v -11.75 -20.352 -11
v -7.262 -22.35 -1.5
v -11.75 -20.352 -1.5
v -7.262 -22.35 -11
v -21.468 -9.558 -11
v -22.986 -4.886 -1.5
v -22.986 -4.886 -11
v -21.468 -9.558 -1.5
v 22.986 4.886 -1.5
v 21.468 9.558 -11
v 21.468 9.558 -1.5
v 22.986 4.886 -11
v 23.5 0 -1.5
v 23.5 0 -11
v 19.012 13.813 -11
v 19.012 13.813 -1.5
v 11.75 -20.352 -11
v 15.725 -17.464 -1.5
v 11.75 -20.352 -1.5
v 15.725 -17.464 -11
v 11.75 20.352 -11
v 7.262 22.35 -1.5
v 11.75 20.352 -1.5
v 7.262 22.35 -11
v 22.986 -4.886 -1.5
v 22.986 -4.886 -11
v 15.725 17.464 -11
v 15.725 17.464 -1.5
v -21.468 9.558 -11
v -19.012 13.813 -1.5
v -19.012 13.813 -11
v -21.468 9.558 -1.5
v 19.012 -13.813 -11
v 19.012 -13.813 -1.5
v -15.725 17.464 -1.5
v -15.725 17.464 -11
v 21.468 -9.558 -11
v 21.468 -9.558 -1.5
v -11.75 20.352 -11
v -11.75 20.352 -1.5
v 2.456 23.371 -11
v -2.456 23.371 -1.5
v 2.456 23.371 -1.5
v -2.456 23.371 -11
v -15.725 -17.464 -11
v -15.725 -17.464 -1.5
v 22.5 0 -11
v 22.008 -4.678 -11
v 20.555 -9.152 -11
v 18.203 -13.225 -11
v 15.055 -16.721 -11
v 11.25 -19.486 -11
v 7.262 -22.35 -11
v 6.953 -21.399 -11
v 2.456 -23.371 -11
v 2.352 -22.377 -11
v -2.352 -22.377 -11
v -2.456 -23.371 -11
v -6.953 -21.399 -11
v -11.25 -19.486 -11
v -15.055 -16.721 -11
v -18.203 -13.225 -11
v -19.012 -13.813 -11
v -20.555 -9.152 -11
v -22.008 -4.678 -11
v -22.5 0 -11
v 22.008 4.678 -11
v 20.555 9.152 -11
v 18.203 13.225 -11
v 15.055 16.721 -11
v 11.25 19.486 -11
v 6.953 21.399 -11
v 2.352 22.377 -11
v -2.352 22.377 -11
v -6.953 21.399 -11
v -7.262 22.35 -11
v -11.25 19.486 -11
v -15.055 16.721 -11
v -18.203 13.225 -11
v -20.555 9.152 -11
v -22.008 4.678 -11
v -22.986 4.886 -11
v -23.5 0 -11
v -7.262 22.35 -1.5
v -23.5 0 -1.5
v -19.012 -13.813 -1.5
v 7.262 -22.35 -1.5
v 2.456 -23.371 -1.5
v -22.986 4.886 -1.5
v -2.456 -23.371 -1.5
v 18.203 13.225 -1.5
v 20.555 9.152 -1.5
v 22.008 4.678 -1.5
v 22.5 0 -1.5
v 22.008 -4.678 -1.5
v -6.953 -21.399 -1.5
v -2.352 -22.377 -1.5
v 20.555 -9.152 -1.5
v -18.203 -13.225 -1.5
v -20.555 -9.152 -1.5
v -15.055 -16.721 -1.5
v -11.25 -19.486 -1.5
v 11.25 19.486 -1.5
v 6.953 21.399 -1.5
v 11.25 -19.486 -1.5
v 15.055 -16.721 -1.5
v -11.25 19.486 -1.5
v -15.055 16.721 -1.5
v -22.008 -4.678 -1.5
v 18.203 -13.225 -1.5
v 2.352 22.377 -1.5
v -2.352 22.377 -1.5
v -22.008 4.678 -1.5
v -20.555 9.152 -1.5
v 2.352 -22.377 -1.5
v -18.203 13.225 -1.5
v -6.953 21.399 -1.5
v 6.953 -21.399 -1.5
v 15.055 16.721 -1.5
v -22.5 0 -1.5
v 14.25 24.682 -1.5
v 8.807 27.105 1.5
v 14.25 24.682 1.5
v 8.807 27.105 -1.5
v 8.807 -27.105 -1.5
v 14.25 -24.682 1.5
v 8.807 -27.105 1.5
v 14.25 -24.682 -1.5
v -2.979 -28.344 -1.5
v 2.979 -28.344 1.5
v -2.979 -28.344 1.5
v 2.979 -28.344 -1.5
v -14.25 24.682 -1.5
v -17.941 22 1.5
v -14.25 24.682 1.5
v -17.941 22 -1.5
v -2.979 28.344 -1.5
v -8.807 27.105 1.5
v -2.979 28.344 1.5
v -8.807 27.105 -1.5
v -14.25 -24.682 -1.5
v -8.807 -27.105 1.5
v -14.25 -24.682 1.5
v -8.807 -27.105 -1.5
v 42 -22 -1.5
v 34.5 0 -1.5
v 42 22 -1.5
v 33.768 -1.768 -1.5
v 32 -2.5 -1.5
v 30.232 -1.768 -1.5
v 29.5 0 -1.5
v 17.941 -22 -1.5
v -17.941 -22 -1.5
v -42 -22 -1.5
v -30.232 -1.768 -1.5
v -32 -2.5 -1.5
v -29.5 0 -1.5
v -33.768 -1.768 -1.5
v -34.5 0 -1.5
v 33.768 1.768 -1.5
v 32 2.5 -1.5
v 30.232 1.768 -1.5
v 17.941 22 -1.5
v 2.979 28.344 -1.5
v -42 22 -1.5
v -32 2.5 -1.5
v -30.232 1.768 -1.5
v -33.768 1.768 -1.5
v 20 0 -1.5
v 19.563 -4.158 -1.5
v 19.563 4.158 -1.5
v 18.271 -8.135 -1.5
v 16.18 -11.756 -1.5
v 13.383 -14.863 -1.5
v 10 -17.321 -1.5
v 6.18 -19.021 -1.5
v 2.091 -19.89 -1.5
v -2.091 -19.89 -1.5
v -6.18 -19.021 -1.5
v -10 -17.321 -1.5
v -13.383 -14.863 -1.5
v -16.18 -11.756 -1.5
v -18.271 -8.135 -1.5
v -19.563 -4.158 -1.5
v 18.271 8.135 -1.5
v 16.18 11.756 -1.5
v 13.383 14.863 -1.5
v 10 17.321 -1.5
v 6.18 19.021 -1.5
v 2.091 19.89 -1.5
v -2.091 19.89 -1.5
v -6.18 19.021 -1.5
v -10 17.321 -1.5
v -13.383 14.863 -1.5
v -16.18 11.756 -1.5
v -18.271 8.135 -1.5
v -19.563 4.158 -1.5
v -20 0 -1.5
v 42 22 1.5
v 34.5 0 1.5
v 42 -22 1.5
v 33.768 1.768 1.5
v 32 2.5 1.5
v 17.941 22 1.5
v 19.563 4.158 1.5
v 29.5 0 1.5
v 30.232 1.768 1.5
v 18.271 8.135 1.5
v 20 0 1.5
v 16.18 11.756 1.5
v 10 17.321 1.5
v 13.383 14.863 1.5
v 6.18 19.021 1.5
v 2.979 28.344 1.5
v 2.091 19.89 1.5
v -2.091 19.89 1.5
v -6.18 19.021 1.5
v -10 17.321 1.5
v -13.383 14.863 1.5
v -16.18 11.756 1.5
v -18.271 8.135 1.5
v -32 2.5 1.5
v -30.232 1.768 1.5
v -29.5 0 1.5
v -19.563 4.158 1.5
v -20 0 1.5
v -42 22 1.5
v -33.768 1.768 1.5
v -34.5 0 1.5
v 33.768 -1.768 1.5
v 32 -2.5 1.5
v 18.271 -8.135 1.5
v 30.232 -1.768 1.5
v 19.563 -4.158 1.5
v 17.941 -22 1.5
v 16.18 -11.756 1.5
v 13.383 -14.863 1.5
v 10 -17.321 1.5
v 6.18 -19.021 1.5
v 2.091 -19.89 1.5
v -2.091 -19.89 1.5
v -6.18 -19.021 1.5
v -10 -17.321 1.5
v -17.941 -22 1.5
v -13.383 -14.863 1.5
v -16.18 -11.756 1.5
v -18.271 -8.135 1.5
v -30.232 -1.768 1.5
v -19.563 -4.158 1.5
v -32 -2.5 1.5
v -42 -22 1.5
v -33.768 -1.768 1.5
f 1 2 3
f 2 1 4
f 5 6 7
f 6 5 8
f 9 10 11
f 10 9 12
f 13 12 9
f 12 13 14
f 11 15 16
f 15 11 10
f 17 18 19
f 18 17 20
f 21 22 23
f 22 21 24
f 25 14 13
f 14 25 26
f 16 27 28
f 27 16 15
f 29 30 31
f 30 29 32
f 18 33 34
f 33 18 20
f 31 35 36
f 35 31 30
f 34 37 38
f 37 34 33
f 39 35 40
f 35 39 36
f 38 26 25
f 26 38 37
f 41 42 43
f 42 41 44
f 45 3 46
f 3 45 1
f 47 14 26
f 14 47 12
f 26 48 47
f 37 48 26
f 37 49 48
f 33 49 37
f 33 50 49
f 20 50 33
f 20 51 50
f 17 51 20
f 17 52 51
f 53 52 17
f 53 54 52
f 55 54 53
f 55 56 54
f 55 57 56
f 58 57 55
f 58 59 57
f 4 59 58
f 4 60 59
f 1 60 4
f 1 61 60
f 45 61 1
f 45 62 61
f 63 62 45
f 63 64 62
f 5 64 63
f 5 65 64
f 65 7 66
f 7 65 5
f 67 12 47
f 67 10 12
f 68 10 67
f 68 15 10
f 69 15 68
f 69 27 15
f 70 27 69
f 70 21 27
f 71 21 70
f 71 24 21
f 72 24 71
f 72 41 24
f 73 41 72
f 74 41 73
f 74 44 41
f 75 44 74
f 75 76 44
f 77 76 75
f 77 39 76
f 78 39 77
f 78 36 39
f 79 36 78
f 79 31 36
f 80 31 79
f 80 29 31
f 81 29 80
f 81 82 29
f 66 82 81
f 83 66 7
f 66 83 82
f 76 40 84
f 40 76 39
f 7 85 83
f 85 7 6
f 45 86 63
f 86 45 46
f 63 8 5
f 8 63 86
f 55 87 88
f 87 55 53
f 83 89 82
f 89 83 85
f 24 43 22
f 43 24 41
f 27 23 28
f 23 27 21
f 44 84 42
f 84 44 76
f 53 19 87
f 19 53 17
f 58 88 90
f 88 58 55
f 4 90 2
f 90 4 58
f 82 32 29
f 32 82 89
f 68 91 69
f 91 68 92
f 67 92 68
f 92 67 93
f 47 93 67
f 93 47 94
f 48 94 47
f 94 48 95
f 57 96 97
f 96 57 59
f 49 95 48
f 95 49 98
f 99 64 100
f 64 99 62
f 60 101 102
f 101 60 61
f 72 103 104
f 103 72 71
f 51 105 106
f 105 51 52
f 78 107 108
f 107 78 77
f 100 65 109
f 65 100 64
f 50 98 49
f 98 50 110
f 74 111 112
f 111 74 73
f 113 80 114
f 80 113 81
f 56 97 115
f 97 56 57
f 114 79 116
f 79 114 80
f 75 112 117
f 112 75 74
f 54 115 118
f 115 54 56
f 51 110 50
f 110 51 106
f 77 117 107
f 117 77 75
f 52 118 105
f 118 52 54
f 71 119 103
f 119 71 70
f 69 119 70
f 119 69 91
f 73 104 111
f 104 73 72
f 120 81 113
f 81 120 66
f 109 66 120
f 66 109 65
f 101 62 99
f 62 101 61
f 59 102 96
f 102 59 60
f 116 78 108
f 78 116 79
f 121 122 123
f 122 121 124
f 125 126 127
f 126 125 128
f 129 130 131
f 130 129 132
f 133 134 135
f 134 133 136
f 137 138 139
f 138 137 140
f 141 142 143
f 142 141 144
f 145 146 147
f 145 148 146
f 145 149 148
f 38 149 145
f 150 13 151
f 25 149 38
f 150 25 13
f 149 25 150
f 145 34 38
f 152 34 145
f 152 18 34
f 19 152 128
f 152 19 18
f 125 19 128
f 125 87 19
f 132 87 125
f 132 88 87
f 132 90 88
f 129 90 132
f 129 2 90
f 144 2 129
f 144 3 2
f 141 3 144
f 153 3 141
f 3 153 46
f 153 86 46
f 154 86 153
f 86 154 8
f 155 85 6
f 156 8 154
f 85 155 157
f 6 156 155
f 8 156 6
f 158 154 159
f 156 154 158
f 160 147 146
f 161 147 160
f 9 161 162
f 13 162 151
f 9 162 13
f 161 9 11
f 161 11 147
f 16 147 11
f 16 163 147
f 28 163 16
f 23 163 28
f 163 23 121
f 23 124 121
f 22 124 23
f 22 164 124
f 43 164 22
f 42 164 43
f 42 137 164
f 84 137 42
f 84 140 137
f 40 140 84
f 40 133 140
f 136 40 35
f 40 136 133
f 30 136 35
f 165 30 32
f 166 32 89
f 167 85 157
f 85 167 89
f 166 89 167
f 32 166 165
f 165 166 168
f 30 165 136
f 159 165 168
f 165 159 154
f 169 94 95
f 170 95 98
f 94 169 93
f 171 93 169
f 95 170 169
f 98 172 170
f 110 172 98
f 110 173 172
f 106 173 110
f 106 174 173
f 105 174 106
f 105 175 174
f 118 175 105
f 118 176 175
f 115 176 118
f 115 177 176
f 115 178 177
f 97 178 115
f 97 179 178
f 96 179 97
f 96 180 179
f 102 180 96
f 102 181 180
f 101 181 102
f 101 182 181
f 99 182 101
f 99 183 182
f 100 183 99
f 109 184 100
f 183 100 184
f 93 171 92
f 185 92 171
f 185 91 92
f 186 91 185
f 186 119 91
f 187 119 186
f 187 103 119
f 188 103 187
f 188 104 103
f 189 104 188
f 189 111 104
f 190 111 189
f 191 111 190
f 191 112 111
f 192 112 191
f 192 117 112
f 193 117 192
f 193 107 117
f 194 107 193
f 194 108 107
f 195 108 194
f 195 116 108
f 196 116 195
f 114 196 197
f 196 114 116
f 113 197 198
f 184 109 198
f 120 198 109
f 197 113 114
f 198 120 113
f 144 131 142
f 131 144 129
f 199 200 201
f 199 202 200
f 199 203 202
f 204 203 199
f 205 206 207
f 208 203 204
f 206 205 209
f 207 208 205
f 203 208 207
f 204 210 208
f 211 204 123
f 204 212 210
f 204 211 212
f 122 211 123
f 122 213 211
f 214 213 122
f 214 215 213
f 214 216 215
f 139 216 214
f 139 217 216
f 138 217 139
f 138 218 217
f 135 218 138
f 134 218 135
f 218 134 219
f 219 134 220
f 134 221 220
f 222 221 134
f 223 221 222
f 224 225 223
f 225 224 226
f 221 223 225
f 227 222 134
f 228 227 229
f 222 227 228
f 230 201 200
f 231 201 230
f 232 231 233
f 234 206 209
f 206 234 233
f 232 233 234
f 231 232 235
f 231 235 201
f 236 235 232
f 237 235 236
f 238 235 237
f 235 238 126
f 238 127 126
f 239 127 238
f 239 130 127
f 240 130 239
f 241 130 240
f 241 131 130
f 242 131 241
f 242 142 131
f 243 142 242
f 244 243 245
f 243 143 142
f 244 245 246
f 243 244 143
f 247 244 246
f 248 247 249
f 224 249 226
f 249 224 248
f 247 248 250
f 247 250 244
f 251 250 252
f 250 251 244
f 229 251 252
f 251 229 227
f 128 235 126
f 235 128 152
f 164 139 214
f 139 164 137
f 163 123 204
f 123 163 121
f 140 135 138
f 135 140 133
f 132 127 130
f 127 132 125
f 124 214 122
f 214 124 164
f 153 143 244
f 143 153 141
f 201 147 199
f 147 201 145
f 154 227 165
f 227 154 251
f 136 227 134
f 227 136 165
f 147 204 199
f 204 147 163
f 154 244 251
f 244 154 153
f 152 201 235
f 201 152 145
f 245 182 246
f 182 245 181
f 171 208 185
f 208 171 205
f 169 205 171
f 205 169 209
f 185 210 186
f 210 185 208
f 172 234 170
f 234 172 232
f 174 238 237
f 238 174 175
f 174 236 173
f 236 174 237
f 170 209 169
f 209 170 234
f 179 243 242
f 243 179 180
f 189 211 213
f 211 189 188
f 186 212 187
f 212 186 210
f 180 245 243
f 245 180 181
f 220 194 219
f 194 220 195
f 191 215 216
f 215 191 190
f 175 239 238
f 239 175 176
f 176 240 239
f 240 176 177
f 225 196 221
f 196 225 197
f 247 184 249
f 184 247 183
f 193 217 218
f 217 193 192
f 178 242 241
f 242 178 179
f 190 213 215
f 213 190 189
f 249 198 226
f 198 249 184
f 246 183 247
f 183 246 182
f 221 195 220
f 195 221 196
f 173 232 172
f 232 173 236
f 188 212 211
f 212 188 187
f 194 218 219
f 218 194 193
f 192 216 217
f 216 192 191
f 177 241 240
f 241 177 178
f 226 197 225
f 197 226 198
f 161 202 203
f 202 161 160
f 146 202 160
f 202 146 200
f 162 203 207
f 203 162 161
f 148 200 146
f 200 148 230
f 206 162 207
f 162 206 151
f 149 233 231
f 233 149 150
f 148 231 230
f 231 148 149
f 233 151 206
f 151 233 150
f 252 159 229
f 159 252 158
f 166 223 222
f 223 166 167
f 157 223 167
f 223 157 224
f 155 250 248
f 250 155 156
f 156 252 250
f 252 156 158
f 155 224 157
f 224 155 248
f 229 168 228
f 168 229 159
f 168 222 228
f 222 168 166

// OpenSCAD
/* This file contains a tweeter speaker mount for cylindical
   tweeters, where the tweeter is glued to mount and the
   mount is either glued or screwed to the speaker.
*/

/** PARAMS **/
id = 39; // inner diameter in mm
od = 44; // outer diameter in mm
sd = 4;  // screw diameter in mm (set to -1 if glued)

/** MOUNT **/
difference(){
    union(){
        translate([0, 0, -6]){
            difference(){
                cylinder(h = 10, d = od+3, center = true);
                cylinder(h = 20, d = od+1, center = true);
            };
        };
        difference(){
            union(){
                cylinder(h = 3, d = od+13, center = true);
                cube([od+40, od, 3], center = true);
            };
            cylinder(h = 4, d = id+1, center = true);
        };
    };
    union(){
        translate([(od / 2) + 10, 0, -1]){
            cylinder(h = 6, d = sd+1, center = true);
        }
        translate([-(od / 2) - 10, 0, -1]){
            cylinder(h = 6, d = sd+1, center = true);
        }
    }
}
